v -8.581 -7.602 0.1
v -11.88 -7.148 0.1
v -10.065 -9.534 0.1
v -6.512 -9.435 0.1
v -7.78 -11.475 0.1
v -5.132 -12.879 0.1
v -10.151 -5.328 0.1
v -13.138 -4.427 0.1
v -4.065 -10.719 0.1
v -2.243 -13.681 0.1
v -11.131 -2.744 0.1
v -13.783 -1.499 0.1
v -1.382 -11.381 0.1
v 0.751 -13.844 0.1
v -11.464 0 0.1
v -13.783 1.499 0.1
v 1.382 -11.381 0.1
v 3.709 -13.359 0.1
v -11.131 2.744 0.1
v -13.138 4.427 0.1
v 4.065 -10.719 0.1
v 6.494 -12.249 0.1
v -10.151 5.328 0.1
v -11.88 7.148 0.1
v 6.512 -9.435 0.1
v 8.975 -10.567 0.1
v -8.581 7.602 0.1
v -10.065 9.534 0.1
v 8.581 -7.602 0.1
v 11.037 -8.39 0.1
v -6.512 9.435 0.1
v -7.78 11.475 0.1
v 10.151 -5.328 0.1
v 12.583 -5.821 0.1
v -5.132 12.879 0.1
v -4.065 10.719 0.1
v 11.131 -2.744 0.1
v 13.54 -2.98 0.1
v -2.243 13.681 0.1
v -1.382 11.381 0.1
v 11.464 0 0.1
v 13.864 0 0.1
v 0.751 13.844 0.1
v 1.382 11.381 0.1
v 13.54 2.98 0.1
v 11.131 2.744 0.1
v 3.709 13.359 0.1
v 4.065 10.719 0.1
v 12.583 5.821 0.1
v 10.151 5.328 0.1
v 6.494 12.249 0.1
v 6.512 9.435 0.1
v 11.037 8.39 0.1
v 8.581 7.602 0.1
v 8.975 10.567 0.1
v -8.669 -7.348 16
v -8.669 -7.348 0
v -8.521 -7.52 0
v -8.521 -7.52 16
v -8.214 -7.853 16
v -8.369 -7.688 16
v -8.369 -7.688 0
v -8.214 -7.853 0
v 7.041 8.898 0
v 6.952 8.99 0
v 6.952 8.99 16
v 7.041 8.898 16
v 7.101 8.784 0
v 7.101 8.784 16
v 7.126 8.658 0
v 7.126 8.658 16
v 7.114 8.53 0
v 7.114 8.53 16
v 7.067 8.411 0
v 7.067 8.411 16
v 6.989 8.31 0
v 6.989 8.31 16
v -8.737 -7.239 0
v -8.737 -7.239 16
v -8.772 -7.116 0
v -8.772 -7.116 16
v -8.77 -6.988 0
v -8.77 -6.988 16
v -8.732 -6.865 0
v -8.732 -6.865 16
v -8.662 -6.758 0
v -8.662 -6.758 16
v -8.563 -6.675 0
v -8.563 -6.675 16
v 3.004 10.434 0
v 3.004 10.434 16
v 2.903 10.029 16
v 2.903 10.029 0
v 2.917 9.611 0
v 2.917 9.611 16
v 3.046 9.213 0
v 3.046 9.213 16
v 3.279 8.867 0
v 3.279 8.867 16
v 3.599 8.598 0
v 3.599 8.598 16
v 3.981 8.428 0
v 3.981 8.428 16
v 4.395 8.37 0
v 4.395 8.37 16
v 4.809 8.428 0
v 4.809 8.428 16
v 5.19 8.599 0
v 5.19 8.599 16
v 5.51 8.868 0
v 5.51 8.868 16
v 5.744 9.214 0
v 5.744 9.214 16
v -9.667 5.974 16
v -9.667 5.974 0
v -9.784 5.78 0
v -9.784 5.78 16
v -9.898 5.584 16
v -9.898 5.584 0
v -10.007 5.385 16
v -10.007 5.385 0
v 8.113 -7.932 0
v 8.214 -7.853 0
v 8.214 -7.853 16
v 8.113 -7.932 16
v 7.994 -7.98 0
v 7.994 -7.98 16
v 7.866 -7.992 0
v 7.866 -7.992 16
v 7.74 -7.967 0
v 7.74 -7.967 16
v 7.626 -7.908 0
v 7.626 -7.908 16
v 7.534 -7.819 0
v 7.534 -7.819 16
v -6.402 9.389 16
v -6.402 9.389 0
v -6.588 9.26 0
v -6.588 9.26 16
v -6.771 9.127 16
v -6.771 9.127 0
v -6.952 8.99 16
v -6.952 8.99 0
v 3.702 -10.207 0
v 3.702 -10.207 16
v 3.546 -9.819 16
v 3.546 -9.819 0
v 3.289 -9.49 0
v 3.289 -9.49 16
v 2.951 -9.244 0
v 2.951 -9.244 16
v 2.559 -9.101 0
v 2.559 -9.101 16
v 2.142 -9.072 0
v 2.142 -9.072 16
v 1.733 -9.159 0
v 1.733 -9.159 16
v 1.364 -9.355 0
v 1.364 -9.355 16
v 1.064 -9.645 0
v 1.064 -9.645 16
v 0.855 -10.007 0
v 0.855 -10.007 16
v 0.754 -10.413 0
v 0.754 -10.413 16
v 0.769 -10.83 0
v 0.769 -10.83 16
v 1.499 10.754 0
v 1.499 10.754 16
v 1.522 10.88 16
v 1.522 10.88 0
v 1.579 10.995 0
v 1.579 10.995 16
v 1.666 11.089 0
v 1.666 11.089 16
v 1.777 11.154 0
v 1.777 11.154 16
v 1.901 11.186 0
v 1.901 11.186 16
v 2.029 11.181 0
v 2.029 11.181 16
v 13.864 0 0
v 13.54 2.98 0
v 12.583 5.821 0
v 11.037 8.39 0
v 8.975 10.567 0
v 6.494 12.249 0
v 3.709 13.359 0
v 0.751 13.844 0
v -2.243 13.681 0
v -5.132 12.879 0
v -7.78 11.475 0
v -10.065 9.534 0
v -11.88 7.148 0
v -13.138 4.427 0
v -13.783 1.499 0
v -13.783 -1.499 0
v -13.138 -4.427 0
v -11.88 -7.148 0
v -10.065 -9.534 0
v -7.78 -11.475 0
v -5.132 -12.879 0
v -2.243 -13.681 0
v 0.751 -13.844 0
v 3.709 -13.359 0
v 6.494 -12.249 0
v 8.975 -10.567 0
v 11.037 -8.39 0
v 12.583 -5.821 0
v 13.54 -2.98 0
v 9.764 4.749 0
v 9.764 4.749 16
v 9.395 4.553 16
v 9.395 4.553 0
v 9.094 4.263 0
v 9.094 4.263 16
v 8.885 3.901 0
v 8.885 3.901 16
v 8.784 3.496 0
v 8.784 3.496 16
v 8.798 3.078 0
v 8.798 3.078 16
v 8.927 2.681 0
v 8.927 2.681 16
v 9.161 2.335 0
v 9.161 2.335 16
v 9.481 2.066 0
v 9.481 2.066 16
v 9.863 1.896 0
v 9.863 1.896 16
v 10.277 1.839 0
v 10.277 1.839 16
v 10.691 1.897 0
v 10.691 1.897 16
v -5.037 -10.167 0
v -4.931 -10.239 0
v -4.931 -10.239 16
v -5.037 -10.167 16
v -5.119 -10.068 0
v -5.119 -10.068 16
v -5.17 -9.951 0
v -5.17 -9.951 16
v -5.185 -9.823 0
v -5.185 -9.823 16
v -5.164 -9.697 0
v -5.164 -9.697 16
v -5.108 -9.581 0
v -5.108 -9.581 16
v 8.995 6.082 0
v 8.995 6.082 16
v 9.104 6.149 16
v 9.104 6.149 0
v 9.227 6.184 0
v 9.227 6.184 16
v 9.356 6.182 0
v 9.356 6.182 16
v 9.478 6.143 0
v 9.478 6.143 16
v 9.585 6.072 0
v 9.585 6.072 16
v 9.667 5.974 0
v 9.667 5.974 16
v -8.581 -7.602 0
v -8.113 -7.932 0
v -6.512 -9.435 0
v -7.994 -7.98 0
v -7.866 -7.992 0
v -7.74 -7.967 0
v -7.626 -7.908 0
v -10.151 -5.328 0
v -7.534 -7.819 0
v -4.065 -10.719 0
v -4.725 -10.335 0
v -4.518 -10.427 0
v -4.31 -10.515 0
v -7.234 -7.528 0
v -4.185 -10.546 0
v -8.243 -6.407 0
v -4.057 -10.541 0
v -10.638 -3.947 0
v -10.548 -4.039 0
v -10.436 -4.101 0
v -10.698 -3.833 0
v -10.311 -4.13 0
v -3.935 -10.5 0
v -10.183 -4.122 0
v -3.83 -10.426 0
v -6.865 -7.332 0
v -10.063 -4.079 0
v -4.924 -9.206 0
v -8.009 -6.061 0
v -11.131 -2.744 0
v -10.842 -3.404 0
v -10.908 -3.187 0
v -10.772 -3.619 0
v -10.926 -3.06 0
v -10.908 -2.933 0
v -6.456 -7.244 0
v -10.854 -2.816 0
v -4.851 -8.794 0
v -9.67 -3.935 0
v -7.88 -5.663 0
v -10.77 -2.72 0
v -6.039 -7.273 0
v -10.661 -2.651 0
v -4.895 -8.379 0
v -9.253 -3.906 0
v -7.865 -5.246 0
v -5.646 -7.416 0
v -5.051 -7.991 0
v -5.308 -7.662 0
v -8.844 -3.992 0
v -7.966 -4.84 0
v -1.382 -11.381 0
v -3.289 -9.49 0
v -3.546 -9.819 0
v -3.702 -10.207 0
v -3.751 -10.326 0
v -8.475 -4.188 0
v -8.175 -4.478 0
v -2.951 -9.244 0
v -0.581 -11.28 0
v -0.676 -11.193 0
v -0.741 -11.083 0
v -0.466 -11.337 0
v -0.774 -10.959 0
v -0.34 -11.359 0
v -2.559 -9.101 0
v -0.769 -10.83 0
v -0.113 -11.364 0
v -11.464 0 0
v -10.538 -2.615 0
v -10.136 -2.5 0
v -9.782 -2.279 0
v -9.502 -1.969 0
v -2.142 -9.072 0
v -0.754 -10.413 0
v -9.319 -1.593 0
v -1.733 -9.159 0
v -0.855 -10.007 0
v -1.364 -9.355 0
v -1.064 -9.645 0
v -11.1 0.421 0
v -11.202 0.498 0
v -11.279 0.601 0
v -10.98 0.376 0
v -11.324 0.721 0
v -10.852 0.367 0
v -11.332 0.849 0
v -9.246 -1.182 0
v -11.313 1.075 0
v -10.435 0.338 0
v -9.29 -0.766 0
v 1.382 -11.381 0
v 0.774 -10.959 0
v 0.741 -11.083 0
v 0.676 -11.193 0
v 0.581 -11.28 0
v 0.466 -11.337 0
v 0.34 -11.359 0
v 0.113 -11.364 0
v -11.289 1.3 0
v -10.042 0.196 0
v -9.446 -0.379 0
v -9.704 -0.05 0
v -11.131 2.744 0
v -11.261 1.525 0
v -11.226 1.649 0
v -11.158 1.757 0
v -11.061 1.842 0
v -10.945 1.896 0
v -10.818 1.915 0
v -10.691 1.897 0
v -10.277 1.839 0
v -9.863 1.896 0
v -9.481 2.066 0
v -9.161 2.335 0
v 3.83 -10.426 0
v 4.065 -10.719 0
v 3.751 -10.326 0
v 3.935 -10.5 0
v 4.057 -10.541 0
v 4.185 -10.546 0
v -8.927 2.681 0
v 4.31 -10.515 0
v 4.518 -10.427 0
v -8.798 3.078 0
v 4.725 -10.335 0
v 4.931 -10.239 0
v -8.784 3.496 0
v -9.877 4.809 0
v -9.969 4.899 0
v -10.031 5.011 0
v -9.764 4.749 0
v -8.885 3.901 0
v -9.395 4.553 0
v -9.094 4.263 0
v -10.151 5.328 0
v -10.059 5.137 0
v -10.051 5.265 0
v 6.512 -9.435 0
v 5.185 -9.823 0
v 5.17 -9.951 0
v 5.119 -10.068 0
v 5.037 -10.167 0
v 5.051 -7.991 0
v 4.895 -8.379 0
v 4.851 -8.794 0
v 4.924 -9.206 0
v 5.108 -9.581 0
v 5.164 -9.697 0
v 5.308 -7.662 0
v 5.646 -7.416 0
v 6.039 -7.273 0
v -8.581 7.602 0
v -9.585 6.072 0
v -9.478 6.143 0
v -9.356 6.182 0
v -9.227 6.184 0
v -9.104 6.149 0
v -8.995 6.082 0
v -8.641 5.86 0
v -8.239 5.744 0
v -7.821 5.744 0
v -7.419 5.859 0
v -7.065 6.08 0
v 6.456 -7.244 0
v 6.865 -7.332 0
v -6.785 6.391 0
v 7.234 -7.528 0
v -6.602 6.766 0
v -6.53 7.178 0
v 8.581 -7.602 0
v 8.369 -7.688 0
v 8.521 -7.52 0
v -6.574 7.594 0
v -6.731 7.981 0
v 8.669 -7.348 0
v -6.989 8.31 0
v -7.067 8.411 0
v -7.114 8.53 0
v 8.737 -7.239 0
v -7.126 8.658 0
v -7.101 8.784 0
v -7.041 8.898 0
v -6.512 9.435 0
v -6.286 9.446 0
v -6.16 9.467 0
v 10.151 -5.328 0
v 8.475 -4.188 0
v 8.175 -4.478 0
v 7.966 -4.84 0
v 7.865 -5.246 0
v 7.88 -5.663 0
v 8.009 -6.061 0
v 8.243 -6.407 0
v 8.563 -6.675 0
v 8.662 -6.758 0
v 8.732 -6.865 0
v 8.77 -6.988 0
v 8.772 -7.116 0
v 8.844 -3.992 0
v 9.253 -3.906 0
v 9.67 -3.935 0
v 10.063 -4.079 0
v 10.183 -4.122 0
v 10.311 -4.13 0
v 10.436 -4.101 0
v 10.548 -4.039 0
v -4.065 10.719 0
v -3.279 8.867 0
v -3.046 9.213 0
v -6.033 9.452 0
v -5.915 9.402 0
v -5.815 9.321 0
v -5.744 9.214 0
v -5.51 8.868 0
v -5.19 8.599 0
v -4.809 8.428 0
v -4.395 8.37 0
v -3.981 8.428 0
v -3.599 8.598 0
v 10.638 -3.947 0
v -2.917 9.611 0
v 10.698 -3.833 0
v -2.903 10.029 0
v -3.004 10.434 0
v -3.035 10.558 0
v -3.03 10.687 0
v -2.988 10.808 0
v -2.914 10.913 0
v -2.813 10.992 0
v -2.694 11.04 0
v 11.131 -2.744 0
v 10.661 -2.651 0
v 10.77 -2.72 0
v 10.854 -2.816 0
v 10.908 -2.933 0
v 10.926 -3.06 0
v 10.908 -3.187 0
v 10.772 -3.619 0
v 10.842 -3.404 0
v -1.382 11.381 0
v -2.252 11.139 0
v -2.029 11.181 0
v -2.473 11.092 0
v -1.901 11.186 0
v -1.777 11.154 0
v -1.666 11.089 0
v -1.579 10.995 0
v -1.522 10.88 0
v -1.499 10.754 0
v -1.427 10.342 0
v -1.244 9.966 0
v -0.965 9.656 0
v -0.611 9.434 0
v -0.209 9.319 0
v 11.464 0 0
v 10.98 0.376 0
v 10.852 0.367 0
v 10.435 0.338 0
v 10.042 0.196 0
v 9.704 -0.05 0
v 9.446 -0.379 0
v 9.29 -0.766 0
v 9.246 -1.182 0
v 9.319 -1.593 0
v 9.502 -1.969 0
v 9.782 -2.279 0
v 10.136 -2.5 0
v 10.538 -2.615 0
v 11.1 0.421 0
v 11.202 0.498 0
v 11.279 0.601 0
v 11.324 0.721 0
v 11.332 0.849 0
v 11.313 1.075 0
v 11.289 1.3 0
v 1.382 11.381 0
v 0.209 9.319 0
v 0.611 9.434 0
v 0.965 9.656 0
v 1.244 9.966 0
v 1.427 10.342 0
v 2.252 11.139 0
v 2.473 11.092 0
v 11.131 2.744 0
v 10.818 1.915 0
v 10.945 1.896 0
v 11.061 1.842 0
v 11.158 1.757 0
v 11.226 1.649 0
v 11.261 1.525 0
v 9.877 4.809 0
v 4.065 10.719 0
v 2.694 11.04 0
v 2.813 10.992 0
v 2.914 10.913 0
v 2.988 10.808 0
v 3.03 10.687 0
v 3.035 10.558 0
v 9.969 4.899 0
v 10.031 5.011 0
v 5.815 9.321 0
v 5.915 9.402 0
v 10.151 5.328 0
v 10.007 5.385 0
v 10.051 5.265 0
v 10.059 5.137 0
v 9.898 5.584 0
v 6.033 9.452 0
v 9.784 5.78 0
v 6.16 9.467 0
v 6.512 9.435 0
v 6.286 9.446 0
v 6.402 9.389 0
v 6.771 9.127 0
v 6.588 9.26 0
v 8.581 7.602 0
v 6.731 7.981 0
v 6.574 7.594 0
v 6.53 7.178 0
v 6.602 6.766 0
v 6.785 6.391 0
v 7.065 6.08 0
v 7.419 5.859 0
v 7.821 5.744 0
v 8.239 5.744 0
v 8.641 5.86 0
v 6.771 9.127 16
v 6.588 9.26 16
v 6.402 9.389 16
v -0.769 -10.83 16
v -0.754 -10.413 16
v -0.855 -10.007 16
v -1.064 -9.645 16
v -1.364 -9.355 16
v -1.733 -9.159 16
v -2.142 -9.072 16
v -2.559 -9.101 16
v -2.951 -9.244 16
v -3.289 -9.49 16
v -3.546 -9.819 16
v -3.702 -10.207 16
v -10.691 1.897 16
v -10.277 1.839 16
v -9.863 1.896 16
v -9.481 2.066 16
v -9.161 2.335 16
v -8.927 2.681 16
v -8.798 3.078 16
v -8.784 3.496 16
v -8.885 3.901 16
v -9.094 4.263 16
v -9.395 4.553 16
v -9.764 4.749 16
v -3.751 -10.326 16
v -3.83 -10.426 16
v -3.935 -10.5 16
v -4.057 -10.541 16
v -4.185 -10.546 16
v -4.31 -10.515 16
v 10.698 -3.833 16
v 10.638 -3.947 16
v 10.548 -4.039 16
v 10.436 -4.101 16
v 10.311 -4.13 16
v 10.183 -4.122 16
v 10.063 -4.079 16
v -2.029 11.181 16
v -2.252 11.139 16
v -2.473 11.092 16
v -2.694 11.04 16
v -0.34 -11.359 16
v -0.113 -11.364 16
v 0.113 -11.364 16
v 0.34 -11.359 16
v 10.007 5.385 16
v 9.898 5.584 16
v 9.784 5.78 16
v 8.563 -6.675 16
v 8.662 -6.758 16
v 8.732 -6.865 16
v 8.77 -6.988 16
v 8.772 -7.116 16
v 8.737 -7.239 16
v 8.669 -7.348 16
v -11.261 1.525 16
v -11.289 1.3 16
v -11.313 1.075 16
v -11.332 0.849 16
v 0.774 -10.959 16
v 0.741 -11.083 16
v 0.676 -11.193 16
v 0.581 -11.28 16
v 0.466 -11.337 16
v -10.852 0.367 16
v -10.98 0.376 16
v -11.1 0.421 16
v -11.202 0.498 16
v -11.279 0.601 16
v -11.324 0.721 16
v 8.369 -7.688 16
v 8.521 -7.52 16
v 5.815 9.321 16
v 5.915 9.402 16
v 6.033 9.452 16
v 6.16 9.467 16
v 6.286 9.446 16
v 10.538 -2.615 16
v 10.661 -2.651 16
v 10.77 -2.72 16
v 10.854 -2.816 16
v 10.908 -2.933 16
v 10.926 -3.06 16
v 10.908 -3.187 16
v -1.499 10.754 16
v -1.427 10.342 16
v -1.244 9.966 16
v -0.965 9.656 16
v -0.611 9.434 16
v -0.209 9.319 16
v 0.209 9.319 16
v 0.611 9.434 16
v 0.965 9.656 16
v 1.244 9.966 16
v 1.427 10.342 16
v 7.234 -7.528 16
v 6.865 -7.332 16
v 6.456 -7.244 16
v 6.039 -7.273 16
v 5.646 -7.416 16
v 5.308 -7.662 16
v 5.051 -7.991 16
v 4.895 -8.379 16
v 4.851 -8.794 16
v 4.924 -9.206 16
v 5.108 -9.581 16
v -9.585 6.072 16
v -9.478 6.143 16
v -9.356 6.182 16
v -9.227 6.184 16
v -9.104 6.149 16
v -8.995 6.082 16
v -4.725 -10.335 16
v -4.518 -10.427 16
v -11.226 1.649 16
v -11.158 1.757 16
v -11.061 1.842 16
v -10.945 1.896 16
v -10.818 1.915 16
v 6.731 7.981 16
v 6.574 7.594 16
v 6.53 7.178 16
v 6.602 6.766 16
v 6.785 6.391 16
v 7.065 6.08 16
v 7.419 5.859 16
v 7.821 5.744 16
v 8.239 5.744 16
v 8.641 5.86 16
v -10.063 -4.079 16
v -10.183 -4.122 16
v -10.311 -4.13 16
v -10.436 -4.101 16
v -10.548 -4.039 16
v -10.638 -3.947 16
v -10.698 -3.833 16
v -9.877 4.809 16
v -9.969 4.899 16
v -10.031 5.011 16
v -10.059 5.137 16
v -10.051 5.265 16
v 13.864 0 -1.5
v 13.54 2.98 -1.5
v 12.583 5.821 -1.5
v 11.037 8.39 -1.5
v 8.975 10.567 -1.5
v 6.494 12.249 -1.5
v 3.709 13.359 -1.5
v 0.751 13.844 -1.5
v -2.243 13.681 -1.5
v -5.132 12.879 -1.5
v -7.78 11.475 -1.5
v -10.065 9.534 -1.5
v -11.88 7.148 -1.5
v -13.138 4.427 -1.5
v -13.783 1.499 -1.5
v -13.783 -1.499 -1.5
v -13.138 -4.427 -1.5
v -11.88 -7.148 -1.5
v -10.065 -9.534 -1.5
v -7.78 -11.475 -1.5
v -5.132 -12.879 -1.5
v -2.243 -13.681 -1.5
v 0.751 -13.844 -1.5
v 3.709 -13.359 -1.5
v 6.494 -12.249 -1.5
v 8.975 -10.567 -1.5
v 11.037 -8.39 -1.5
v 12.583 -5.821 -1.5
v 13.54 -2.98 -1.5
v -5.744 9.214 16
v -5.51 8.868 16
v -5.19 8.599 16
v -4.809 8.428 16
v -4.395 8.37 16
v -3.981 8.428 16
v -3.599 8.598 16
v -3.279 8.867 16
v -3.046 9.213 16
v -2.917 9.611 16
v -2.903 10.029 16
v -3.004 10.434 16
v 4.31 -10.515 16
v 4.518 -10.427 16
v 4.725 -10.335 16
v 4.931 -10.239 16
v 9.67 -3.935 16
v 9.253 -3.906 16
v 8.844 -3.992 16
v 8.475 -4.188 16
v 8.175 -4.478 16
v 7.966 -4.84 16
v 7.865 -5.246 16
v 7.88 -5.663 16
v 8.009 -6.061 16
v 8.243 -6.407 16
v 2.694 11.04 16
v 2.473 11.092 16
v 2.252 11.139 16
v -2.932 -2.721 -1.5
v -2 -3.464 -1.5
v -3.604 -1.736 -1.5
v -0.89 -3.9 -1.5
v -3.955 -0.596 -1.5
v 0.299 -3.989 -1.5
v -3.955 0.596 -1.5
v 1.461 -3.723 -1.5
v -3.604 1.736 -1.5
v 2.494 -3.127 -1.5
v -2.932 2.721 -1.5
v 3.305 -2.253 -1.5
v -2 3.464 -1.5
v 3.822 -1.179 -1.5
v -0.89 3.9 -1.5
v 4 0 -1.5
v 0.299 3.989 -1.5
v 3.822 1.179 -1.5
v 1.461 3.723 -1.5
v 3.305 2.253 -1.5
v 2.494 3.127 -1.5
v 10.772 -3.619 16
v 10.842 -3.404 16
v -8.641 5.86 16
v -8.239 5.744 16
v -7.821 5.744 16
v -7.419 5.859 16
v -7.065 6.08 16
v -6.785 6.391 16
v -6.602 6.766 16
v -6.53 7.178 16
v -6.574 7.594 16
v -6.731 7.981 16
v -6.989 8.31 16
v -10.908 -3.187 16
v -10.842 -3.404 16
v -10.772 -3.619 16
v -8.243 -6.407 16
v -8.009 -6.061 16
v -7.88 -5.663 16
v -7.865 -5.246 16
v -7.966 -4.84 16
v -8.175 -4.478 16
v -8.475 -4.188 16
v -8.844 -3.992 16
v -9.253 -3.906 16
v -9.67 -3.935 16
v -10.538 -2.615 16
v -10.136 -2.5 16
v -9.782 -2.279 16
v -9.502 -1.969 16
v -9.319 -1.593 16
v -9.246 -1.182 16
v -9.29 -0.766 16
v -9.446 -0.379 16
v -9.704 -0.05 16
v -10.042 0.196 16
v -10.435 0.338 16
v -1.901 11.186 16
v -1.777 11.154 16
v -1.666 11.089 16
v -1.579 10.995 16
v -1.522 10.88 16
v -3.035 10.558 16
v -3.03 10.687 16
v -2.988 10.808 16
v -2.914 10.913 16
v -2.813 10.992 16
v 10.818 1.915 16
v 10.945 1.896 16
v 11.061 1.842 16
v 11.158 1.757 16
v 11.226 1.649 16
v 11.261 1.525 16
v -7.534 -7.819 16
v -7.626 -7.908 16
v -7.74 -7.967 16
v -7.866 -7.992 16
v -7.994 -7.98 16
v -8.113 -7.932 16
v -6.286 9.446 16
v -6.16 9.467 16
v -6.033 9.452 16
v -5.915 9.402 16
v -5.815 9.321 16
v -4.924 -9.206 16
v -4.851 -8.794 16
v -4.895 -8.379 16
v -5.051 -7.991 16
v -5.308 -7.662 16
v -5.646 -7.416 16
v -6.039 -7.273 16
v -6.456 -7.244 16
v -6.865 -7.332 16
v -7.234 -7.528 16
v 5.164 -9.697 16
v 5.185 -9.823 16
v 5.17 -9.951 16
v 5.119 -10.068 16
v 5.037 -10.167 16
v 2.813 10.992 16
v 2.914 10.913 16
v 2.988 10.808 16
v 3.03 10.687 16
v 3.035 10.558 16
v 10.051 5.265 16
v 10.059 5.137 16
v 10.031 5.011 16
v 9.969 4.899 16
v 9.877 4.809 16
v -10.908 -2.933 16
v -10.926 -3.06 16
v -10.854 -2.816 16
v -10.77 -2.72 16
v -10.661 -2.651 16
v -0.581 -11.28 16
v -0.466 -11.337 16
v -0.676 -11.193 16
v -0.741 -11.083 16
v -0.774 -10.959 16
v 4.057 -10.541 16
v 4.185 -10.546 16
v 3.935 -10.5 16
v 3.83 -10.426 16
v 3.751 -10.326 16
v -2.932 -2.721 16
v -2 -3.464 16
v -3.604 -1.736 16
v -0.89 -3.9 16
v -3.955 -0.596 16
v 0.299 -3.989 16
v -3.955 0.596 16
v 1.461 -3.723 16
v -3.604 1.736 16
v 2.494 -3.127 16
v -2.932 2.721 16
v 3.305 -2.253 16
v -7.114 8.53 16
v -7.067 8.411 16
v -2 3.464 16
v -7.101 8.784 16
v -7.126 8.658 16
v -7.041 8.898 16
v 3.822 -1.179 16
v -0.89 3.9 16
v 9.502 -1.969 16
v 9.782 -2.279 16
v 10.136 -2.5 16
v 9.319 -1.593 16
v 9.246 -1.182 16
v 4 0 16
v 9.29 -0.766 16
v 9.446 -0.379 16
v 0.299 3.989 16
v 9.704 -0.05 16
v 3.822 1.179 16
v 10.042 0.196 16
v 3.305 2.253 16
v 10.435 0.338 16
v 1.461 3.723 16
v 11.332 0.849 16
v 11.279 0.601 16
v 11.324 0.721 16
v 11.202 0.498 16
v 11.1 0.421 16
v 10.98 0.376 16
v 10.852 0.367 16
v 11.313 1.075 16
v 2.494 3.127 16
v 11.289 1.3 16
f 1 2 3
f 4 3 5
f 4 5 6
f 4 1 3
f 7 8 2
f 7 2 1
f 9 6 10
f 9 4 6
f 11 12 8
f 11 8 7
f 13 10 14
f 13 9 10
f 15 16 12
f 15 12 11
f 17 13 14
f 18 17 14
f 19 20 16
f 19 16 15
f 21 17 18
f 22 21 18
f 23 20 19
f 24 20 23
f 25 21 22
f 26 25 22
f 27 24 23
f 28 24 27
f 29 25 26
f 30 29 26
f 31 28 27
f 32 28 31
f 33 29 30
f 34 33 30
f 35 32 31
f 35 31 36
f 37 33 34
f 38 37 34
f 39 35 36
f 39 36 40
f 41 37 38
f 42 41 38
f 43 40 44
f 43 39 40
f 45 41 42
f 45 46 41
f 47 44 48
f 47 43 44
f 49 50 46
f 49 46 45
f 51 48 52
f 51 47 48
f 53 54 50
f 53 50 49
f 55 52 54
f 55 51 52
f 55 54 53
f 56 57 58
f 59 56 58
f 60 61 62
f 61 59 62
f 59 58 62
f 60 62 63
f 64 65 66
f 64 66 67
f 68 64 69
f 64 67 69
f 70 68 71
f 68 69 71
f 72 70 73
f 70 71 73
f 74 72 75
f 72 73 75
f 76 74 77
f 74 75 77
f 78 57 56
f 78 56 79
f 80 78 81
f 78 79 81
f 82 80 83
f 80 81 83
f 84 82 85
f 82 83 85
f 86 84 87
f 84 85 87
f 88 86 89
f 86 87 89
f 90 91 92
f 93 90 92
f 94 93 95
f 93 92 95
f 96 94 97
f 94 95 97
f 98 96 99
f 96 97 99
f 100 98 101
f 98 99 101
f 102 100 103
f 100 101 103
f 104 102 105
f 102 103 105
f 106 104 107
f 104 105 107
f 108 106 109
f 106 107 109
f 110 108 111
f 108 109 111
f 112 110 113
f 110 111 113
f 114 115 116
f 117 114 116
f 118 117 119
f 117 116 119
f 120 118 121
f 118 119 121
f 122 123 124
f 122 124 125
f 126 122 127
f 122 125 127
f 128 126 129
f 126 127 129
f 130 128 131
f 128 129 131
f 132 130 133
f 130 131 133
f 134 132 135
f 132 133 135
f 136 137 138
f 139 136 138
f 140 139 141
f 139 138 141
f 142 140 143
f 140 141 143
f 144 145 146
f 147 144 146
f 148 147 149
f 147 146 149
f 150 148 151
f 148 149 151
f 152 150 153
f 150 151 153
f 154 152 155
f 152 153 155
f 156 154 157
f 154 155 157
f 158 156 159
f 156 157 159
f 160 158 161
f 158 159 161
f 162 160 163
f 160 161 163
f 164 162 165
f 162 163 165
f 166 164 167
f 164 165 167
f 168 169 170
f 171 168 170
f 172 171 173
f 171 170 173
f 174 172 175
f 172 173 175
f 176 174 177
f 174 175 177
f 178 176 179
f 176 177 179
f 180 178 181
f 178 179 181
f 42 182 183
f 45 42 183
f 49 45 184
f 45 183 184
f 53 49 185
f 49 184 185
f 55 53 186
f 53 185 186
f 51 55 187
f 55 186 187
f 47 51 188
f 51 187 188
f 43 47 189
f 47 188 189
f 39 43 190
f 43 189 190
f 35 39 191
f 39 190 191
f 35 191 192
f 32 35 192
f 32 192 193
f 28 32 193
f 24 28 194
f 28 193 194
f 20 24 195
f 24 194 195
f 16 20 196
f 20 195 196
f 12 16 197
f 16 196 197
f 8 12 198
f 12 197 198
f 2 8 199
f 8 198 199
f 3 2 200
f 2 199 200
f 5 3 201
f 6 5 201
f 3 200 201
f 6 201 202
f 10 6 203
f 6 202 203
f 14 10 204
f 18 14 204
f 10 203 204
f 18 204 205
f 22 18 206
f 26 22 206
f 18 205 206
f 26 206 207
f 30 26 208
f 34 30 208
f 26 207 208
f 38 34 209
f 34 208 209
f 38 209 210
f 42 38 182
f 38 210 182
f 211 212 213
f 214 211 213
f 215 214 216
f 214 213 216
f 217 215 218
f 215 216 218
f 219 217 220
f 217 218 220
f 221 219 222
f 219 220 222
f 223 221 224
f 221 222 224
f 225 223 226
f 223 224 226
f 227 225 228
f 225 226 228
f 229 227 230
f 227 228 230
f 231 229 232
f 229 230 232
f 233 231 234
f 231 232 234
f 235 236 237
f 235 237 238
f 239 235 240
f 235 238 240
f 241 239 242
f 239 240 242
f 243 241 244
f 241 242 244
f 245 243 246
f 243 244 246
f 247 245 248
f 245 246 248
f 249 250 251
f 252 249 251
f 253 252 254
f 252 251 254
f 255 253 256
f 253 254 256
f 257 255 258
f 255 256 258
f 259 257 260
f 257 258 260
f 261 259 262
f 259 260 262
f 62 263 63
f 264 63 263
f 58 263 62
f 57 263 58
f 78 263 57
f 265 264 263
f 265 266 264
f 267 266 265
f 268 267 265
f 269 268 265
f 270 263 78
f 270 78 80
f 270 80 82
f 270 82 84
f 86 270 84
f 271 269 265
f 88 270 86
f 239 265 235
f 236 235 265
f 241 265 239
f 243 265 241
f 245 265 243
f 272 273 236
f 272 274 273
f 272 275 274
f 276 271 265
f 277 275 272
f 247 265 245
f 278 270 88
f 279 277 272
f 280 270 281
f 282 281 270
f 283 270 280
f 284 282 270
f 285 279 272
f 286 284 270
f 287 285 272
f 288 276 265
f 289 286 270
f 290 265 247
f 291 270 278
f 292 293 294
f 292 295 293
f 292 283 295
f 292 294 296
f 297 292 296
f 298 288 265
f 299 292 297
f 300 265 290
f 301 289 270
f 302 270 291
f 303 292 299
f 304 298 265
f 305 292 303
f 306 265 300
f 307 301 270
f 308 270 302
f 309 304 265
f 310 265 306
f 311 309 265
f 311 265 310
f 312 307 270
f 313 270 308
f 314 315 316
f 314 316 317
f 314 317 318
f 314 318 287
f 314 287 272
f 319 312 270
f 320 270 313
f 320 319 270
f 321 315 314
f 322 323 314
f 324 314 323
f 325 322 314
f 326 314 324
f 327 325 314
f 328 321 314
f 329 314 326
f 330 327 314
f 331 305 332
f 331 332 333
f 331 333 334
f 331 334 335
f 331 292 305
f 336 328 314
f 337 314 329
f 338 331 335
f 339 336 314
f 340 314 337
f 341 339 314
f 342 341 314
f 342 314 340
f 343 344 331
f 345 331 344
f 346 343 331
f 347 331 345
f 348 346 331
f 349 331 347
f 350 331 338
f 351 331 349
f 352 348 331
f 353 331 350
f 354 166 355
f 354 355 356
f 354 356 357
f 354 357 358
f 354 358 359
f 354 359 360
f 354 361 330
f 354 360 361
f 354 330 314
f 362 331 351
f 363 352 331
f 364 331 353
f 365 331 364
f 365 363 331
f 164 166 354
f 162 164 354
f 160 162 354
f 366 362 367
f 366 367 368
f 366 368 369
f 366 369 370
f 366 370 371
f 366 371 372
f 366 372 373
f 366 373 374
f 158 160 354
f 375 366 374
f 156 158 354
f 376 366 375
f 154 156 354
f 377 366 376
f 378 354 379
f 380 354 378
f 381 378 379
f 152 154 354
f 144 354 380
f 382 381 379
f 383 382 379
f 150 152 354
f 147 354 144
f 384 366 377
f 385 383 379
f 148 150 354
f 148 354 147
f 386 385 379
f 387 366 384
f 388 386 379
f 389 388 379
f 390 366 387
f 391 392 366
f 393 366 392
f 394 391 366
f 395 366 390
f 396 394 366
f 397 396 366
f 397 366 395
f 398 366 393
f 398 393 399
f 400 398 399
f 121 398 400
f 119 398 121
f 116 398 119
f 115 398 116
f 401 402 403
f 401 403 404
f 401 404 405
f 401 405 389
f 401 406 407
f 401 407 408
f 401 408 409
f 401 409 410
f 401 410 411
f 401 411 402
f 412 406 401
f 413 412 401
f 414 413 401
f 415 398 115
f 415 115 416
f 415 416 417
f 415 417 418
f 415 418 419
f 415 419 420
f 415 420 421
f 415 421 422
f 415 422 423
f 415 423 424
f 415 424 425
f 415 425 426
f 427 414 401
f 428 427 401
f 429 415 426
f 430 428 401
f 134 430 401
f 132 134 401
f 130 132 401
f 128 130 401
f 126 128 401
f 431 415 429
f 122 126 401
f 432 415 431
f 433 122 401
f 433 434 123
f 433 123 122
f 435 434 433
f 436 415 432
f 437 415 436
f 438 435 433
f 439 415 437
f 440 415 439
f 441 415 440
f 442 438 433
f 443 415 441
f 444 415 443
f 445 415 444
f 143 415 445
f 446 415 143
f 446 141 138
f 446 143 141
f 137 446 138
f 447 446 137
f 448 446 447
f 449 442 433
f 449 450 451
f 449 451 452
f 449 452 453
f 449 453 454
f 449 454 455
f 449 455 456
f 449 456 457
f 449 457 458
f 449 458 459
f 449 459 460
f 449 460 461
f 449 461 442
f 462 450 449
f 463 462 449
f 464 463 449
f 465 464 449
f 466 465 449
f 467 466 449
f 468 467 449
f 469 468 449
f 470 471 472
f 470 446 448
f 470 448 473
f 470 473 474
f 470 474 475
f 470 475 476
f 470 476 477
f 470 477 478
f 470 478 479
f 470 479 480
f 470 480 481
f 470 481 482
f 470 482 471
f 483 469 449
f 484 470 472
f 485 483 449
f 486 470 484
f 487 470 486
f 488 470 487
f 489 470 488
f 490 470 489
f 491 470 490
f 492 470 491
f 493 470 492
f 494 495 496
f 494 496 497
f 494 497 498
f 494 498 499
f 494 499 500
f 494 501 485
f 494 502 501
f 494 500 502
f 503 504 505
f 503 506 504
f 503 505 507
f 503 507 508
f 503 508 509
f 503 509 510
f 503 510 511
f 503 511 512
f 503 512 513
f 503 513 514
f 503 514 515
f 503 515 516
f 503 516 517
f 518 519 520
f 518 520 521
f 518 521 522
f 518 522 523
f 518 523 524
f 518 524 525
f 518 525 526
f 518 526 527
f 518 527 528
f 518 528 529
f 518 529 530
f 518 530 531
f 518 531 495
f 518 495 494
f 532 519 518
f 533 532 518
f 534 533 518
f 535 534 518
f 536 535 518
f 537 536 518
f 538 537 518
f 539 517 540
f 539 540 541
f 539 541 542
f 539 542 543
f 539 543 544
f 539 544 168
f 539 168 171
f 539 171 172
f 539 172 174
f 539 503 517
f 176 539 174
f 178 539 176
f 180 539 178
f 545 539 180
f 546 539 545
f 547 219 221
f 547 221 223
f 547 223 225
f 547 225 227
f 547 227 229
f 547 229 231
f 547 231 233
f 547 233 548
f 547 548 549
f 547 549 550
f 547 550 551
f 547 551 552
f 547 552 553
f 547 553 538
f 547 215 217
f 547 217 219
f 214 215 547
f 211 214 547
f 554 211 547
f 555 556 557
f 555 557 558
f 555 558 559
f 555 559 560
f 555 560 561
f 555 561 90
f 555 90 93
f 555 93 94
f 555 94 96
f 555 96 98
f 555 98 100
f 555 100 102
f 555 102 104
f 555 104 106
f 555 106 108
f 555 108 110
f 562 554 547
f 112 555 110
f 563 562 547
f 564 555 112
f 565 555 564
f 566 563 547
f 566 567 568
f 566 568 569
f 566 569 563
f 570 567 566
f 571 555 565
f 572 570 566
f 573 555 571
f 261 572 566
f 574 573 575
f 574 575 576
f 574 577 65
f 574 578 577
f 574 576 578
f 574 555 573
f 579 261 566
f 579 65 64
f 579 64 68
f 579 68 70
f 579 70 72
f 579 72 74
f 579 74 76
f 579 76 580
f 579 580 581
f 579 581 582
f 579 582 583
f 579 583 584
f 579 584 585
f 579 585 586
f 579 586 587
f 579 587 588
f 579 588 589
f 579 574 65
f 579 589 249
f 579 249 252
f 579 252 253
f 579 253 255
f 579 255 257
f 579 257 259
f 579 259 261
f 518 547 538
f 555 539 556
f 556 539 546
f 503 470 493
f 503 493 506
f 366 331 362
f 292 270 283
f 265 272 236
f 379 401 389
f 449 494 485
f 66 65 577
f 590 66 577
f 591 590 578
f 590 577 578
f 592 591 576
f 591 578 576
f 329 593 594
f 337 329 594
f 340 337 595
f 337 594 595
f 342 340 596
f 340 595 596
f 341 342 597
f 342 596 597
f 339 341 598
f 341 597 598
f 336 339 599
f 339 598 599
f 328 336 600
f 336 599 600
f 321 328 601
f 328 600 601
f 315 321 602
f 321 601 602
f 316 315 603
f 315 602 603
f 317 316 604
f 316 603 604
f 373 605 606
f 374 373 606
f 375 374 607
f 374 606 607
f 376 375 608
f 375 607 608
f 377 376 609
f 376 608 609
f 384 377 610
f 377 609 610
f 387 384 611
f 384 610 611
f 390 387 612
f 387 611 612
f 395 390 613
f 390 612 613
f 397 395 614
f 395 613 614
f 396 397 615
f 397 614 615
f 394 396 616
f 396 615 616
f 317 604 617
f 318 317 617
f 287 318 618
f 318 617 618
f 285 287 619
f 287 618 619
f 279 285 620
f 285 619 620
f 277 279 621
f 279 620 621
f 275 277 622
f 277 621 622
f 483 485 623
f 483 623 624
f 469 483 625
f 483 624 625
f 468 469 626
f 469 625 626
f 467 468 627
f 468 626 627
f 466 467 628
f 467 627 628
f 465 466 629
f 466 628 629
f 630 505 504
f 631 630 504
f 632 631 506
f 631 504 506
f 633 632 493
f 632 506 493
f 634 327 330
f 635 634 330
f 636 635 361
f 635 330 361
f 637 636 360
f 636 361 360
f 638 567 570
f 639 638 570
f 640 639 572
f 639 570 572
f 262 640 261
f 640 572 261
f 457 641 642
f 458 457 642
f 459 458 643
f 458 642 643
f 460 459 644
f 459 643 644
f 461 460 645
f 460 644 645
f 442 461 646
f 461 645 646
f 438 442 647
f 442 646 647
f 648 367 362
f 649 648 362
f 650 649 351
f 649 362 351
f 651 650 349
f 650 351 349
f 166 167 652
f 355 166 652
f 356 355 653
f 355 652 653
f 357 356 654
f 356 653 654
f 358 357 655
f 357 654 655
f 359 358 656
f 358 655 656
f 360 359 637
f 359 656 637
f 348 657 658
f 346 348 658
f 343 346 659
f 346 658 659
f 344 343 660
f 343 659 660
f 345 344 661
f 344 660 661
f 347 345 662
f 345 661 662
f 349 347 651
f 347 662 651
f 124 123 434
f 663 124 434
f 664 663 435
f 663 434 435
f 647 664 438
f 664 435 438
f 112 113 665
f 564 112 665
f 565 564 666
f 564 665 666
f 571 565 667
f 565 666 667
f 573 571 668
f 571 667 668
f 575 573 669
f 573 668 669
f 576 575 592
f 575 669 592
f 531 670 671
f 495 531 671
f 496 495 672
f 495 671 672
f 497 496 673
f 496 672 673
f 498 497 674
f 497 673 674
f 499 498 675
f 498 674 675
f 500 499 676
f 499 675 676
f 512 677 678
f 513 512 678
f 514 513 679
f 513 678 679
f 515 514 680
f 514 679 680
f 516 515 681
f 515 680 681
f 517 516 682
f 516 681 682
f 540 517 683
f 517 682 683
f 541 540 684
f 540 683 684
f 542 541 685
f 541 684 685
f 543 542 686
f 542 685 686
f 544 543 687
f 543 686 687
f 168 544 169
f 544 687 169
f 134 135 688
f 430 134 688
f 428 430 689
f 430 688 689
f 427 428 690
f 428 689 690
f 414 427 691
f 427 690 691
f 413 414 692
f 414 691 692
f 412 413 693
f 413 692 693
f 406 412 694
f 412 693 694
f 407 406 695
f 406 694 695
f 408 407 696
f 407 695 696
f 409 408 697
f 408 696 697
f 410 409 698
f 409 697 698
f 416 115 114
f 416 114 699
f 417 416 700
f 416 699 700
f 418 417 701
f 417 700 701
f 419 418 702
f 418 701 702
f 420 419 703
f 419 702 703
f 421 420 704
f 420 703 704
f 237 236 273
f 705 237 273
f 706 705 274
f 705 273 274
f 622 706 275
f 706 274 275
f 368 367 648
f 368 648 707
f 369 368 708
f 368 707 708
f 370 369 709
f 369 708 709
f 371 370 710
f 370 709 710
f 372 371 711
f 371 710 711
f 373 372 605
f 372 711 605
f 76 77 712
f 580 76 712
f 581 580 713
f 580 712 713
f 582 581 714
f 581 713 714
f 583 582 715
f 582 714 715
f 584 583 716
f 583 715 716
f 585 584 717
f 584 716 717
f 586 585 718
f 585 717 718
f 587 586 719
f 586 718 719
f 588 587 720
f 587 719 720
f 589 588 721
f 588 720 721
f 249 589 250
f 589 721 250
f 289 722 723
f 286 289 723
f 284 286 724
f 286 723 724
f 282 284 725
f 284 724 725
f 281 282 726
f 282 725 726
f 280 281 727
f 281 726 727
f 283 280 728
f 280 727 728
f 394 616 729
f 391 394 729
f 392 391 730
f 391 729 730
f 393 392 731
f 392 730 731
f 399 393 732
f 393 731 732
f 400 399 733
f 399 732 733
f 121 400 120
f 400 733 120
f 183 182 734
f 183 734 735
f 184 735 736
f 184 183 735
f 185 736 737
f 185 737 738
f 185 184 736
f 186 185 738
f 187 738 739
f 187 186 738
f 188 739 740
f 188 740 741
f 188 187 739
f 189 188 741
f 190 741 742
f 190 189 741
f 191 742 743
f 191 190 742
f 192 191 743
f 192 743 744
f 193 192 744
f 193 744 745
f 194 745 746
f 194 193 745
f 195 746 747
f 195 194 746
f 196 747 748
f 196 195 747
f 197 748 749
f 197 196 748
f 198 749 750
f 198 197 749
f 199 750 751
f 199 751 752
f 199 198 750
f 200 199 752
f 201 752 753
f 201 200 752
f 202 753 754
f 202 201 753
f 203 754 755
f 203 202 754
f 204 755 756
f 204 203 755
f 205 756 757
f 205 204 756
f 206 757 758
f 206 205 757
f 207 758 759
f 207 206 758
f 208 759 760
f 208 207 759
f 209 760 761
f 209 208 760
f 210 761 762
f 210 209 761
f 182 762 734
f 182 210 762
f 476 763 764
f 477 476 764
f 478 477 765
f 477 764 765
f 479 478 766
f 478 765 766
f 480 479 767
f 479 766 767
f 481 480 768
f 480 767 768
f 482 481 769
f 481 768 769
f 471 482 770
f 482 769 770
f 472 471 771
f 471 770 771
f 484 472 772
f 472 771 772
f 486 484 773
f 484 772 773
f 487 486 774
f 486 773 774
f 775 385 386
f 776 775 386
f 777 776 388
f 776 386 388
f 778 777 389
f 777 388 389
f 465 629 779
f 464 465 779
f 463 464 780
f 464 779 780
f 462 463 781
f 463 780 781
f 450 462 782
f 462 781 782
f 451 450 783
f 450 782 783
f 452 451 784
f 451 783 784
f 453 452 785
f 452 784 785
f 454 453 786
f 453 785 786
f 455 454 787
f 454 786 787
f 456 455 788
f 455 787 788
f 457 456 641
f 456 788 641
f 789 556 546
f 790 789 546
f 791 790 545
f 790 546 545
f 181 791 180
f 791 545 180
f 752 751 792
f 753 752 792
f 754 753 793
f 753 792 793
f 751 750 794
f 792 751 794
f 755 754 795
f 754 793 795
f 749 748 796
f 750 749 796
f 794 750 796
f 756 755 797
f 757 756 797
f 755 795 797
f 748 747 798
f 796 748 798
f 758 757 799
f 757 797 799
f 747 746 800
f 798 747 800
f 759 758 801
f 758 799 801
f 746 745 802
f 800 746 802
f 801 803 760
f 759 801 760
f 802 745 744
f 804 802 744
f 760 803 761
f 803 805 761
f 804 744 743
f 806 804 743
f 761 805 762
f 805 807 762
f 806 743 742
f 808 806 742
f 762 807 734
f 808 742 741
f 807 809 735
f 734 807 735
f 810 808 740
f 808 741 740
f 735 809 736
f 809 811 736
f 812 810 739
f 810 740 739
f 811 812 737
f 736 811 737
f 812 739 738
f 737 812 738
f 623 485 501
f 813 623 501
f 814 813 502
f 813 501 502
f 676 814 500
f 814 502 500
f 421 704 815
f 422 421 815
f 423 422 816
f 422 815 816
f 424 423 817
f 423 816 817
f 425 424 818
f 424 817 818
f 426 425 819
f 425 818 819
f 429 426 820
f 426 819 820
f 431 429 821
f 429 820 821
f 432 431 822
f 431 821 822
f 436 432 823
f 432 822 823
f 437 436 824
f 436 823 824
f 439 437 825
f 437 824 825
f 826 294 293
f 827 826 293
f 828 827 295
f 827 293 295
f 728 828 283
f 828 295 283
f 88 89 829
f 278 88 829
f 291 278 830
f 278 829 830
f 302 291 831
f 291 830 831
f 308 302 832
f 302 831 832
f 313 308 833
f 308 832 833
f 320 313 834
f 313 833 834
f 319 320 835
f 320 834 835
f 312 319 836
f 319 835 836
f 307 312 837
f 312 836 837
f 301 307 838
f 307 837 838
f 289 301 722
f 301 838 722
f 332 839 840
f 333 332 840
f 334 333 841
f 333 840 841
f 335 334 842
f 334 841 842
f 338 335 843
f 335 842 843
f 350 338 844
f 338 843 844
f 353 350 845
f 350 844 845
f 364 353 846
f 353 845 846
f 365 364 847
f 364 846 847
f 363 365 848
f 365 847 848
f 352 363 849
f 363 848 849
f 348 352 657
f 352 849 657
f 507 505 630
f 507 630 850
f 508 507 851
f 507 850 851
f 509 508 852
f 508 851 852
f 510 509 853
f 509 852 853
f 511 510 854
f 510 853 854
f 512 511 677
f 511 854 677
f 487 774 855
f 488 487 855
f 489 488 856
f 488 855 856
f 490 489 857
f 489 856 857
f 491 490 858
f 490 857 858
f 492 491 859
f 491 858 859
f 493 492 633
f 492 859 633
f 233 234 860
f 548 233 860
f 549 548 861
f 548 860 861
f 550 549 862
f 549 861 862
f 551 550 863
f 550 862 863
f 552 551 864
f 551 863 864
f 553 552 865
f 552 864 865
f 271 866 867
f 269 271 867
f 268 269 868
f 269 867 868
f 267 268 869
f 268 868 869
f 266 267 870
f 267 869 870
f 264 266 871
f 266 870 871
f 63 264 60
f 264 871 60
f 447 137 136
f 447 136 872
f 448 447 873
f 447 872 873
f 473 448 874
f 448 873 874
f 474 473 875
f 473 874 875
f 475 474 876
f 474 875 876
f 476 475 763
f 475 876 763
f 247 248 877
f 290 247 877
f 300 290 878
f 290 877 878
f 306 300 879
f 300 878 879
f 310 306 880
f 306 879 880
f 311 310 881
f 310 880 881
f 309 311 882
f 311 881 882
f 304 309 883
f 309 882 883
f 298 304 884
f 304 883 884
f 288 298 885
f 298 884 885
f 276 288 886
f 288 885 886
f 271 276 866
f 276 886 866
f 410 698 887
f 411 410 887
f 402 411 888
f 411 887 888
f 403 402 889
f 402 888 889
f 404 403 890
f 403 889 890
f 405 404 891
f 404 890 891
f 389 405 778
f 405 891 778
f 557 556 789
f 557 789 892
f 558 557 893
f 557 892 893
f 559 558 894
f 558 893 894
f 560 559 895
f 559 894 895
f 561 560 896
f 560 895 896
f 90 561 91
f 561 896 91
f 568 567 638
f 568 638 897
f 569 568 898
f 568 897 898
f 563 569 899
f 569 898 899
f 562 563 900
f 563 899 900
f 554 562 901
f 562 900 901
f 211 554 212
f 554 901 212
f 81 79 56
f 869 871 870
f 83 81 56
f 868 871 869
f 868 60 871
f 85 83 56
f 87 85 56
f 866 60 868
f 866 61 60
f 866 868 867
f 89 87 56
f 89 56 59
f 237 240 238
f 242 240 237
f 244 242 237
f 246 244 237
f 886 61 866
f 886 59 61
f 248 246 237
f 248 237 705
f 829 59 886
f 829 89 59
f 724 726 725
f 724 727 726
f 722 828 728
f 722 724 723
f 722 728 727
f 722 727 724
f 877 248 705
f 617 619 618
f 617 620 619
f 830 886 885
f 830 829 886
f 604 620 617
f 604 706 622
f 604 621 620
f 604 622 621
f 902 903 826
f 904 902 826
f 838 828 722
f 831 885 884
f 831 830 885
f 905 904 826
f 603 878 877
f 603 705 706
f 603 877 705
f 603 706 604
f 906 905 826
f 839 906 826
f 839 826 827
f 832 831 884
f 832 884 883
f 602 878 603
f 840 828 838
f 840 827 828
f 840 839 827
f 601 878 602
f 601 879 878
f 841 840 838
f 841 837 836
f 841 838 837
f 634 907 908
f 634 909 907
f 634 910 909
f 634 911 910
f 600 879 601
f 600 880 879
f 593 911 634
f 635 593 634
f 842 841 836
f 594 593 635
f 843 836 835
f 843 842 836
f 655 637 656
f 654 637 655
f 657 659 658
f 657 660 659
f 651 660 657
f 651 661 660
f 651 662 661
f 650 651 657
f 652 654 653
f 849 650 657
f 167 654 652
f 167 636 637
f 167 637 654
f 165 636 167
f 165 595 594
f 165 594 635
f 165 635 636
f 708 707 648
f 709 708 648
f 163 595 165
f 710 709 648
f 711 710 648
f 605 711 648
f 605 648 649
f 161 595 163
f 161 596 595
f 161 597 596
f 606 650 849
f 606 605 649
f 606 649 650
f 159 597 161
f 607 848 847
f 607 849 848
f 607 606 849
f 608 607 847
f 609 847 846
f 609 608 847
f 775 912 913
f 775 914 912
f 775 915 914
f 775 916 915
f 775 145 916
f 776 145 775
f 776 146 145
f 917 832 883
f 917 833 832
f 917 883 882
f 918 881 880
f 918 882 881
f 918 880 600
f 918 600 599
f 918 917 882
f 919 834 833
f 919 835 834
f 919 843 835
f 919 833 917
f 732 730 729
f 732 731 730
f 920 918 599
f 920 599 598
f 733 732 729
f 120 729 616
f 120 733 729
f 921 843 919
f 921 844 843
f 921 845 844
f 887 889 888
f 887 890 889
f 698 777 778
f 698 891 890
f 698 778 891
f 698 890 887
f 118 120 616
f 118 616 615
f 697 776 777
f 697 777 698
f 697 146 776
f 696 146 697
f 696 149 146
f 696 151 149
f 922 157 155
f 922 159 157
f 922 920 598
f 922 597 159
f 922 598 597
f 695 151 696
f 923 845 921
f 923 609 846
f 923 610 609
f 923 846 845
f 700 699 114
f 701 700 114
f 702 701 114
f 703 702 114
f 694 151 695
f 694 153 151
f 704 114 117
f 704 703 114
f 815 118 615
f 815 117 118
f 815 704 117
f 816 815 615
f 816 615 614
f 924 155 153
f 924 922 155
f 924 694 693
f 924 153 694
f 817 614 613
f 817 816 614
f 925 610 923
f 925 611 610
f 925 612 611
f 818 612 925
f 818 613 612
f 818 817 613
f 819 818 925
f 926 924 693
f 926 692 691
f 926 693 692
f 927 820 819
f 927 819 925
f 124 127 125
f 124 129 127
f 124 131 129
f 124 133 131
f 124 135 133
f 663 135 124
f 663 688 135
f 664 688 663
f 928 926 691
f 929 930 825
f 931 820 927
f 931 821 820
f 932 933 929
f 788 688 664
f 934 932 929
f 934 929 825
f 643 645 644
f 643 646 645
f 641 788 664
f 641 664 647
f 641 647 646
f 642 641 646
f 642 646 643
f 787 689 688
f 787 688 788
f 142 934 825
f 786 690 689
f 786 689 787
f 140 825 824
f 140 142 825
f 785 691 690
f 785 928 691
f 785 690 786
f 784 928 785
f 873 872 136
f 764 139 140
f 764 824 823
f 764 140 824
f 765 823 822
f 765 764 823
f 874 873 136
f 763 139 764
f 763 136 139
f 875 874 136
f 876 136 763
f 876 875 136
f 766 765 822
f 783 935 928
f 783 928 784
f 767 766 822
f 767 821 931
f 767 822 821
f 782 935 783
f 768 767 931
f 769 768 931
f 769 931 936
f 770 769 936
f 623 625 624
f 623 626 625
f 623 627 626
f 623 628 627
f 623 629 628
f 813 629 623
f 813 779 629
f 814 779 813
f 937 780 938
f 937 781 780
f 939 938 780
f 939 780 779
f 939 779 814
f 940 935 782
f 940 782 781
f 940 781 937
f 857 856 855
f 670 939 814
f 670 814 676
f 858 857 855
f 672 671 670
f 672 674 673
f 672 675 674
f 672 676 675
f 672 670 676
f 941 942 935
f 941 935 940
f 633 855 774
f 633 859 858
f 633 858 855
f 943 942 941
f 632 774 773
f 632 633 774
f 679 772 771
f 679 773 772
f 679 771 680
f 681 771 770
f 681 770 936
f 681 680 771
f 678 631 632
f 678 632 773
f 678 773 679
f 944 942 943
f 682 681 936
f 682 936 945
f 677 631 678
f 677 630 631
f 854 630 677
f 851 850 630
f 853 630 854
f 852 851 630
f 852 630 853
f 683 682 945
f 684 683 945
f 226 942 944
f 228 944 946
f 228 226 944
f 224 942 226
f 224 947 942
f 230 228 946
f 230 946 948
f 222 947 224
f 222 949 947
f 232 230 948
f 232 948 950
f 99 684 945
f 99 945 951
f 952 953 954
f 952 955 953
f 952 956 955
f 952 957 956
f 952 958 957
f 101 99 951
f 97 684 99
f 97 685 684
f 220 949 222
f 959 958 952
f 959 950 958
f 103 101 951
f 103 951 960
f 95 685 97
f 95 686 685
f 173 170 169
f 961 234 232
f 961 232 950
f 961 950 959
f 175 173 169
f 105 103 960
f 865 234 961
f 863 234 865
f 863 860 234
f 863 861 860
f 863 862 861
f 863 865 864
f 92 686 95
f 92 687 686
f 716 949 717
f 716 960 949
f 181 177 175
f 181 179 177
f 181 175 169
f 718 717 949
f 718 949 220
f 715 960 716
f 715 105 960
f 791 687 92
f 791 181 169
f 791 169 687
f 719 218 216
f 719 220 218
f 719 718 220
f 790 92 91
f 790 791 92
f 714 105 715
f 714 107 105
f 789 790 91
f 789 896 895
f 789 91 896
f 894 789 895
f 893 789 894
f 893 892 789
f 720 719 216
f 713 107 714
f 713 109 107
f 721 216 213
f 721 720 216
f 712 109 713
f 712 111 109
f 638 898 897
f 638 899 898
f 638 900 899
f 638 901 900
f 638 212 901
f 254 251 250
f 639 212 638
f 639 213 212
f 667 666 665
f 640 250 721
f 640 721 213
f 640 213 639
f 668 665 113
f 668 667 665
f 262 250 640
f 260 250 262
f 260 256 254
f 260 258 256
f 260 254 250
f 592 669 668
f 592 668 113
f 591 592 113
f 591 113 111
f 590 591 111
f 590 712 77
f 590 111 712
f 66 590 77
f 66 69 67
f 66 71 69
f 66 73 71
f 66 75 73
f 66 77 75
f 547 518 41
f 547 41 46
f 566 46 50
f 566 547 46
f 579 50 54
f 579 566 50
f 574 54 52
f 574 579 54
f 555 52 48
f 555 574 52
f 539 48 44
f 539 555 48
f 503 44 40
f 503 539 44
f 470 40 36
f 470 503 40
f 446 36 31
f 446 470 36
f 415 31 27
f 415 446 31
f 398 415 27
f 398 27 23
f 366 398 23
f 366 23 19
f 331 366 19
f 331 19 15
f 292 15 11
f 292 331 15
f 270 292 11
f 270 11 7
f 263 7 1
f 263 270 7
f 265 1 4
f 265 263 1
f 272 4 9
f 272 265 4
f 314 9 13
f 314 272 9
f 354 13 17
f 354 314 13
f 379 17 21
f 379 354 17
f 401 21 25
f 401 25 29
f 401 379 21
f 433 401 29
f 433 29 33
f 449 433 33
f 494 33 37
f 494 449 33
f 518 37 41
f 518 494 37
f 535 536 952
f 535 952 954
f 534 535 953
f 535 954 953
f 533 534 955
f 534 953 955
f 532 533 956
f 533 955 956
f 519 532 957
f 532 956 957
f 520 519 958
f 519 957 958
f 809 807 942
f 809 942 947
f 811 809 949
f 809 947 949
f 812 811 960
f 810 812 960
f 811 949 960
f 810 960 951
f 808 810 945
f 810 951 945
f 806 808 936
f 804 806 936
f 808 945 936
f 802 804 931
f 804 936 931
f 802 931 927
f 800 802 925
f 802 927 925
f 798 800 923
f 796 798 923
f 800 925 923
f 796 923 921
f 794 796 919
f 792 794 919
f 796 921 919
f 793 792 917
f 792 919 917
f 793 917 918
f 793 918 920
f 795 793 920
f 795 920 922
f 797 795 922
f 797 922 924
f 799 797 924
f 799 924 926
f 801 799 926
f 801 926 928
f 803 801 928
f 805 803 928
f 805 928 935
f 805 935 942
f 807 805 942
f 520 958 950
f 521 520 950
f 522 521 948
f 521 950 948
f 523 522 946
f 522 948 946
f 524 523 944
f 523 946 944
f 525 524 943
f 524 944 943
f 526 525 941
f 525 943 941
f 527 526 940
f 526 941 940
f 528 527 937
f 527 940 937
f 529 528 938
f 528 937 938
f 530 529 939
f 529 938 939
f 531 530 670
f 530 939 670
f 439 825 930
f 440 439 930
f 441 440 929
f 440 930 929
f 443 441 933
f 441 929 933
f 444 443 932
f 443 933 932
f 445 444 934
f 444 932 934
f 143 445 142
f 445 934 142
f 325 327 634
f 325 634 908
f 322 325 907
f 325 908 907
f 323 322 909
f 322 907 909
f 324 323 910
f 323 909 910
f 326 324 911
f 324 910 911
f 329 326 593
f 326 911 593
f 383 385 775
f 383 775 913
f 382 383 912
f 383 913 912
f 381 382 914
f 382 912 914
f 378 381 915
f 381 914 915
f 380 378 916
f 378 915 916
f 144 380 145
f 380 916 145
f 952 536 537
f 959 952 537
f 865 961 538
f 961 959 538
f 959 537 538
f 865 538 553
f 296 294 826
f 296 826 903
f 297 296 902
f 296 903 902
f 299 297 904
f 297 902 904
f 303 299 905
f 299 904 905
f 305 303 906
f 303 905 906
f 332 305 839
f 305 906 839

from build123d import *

# Parameters (mm, degrees)
F2_R            = 11.3641207455
F3_DEPTH        = 16
F5_DEPTH        = 16
F5_COPIES_COUNT = 15
F8_R            = 13.8641207455
F8_R_2          = 11.3641207455
F9_DEPTH        = 1.5
F7_R            = 4
F10_DEPTH       = 17.501
F11_R           = 13.8641207455
F11_R_2         = 11.4641207455
F12_DEPTH       = 0.1


# Not quite as in the source:
# - a feature of the source that left no trace in its solid (it failed there, or was rolled back) is left out
# - a pattern or mirror of a feature is missing from the dataset's text; its kind, count and spacing are read off the source's solid


with BuildPart() as f3:
    # F2 (on Top) → F3 (new body)
    with BuildSketch(Plane.XY):
        Circle(F2_R)
    extrude(amount=F3_DEPTH)

    # F4 (on face) → F5 (cut, through all)
    with BuildSketch(Plane.XY.offset(16)):
        with BuildLine():
            ThreePointArc((-2.0292576741, 11.181473678), (-1.6663457301, 11.0889370809), (-1.4991557657, 10.7538018594))
            ThreePointArc((-1.4991557657, 10.7538018594), (0, 9.3041207455), (1.4991557657, 10.7538018594))
            ThreePointArc((1.4991557657, 10.7538018594), (1.6663457301, 11.0889370809), (2.0292576741, 11.181473678))
            ThreePointArc((2.0292576741, 11.181473678), (0, 11.3641207455), (-2.0292576741, 11.181473678))
        make_face()
    f5 = extrude(amount=-F5_DEPTH, mode=Mode.SUBTRACT)

    # F5_copies: F5 ×15 about axis
    f5_copies_axis = Axis((0, 0, 0), (0, 0, 1))
    for i in range(1, F5_COPIES_COUNT):
        add(f5.rotate(f5_copies_axis, i * 360 / F5_COPIES_COUNT), mode=Mode.SUBTRACT)

    # F8 (on face) + F2 (on Top) → F9 (join)
    with BuildSketch(Plane.XY):
        Circle(F8_R)
        Circle(F8_R_2, mode=Mode.SUBTRACT)
    with BuildSketch(Plane.XY):
        Circle(F2_R)
    extrude(amount=-F9_DEPTH)

    # F7 (on face) → F10 (cut, through all)
    with BuildSketch(Plane.XY.offset(16)):
        Circle(F7_R)
    extrude(amount=-F10_DEPTH, mode=Mode.SUBTRACT)

    # F11 (on face) → F12 (join)
    with BuildSketch(Plane.XY):
        Circle(F11_R)
        Circle(F11_R_2, mode=Mode.SUBTRACT)
    extrude(amount=F12_DEPTH)


solid = f3.part
